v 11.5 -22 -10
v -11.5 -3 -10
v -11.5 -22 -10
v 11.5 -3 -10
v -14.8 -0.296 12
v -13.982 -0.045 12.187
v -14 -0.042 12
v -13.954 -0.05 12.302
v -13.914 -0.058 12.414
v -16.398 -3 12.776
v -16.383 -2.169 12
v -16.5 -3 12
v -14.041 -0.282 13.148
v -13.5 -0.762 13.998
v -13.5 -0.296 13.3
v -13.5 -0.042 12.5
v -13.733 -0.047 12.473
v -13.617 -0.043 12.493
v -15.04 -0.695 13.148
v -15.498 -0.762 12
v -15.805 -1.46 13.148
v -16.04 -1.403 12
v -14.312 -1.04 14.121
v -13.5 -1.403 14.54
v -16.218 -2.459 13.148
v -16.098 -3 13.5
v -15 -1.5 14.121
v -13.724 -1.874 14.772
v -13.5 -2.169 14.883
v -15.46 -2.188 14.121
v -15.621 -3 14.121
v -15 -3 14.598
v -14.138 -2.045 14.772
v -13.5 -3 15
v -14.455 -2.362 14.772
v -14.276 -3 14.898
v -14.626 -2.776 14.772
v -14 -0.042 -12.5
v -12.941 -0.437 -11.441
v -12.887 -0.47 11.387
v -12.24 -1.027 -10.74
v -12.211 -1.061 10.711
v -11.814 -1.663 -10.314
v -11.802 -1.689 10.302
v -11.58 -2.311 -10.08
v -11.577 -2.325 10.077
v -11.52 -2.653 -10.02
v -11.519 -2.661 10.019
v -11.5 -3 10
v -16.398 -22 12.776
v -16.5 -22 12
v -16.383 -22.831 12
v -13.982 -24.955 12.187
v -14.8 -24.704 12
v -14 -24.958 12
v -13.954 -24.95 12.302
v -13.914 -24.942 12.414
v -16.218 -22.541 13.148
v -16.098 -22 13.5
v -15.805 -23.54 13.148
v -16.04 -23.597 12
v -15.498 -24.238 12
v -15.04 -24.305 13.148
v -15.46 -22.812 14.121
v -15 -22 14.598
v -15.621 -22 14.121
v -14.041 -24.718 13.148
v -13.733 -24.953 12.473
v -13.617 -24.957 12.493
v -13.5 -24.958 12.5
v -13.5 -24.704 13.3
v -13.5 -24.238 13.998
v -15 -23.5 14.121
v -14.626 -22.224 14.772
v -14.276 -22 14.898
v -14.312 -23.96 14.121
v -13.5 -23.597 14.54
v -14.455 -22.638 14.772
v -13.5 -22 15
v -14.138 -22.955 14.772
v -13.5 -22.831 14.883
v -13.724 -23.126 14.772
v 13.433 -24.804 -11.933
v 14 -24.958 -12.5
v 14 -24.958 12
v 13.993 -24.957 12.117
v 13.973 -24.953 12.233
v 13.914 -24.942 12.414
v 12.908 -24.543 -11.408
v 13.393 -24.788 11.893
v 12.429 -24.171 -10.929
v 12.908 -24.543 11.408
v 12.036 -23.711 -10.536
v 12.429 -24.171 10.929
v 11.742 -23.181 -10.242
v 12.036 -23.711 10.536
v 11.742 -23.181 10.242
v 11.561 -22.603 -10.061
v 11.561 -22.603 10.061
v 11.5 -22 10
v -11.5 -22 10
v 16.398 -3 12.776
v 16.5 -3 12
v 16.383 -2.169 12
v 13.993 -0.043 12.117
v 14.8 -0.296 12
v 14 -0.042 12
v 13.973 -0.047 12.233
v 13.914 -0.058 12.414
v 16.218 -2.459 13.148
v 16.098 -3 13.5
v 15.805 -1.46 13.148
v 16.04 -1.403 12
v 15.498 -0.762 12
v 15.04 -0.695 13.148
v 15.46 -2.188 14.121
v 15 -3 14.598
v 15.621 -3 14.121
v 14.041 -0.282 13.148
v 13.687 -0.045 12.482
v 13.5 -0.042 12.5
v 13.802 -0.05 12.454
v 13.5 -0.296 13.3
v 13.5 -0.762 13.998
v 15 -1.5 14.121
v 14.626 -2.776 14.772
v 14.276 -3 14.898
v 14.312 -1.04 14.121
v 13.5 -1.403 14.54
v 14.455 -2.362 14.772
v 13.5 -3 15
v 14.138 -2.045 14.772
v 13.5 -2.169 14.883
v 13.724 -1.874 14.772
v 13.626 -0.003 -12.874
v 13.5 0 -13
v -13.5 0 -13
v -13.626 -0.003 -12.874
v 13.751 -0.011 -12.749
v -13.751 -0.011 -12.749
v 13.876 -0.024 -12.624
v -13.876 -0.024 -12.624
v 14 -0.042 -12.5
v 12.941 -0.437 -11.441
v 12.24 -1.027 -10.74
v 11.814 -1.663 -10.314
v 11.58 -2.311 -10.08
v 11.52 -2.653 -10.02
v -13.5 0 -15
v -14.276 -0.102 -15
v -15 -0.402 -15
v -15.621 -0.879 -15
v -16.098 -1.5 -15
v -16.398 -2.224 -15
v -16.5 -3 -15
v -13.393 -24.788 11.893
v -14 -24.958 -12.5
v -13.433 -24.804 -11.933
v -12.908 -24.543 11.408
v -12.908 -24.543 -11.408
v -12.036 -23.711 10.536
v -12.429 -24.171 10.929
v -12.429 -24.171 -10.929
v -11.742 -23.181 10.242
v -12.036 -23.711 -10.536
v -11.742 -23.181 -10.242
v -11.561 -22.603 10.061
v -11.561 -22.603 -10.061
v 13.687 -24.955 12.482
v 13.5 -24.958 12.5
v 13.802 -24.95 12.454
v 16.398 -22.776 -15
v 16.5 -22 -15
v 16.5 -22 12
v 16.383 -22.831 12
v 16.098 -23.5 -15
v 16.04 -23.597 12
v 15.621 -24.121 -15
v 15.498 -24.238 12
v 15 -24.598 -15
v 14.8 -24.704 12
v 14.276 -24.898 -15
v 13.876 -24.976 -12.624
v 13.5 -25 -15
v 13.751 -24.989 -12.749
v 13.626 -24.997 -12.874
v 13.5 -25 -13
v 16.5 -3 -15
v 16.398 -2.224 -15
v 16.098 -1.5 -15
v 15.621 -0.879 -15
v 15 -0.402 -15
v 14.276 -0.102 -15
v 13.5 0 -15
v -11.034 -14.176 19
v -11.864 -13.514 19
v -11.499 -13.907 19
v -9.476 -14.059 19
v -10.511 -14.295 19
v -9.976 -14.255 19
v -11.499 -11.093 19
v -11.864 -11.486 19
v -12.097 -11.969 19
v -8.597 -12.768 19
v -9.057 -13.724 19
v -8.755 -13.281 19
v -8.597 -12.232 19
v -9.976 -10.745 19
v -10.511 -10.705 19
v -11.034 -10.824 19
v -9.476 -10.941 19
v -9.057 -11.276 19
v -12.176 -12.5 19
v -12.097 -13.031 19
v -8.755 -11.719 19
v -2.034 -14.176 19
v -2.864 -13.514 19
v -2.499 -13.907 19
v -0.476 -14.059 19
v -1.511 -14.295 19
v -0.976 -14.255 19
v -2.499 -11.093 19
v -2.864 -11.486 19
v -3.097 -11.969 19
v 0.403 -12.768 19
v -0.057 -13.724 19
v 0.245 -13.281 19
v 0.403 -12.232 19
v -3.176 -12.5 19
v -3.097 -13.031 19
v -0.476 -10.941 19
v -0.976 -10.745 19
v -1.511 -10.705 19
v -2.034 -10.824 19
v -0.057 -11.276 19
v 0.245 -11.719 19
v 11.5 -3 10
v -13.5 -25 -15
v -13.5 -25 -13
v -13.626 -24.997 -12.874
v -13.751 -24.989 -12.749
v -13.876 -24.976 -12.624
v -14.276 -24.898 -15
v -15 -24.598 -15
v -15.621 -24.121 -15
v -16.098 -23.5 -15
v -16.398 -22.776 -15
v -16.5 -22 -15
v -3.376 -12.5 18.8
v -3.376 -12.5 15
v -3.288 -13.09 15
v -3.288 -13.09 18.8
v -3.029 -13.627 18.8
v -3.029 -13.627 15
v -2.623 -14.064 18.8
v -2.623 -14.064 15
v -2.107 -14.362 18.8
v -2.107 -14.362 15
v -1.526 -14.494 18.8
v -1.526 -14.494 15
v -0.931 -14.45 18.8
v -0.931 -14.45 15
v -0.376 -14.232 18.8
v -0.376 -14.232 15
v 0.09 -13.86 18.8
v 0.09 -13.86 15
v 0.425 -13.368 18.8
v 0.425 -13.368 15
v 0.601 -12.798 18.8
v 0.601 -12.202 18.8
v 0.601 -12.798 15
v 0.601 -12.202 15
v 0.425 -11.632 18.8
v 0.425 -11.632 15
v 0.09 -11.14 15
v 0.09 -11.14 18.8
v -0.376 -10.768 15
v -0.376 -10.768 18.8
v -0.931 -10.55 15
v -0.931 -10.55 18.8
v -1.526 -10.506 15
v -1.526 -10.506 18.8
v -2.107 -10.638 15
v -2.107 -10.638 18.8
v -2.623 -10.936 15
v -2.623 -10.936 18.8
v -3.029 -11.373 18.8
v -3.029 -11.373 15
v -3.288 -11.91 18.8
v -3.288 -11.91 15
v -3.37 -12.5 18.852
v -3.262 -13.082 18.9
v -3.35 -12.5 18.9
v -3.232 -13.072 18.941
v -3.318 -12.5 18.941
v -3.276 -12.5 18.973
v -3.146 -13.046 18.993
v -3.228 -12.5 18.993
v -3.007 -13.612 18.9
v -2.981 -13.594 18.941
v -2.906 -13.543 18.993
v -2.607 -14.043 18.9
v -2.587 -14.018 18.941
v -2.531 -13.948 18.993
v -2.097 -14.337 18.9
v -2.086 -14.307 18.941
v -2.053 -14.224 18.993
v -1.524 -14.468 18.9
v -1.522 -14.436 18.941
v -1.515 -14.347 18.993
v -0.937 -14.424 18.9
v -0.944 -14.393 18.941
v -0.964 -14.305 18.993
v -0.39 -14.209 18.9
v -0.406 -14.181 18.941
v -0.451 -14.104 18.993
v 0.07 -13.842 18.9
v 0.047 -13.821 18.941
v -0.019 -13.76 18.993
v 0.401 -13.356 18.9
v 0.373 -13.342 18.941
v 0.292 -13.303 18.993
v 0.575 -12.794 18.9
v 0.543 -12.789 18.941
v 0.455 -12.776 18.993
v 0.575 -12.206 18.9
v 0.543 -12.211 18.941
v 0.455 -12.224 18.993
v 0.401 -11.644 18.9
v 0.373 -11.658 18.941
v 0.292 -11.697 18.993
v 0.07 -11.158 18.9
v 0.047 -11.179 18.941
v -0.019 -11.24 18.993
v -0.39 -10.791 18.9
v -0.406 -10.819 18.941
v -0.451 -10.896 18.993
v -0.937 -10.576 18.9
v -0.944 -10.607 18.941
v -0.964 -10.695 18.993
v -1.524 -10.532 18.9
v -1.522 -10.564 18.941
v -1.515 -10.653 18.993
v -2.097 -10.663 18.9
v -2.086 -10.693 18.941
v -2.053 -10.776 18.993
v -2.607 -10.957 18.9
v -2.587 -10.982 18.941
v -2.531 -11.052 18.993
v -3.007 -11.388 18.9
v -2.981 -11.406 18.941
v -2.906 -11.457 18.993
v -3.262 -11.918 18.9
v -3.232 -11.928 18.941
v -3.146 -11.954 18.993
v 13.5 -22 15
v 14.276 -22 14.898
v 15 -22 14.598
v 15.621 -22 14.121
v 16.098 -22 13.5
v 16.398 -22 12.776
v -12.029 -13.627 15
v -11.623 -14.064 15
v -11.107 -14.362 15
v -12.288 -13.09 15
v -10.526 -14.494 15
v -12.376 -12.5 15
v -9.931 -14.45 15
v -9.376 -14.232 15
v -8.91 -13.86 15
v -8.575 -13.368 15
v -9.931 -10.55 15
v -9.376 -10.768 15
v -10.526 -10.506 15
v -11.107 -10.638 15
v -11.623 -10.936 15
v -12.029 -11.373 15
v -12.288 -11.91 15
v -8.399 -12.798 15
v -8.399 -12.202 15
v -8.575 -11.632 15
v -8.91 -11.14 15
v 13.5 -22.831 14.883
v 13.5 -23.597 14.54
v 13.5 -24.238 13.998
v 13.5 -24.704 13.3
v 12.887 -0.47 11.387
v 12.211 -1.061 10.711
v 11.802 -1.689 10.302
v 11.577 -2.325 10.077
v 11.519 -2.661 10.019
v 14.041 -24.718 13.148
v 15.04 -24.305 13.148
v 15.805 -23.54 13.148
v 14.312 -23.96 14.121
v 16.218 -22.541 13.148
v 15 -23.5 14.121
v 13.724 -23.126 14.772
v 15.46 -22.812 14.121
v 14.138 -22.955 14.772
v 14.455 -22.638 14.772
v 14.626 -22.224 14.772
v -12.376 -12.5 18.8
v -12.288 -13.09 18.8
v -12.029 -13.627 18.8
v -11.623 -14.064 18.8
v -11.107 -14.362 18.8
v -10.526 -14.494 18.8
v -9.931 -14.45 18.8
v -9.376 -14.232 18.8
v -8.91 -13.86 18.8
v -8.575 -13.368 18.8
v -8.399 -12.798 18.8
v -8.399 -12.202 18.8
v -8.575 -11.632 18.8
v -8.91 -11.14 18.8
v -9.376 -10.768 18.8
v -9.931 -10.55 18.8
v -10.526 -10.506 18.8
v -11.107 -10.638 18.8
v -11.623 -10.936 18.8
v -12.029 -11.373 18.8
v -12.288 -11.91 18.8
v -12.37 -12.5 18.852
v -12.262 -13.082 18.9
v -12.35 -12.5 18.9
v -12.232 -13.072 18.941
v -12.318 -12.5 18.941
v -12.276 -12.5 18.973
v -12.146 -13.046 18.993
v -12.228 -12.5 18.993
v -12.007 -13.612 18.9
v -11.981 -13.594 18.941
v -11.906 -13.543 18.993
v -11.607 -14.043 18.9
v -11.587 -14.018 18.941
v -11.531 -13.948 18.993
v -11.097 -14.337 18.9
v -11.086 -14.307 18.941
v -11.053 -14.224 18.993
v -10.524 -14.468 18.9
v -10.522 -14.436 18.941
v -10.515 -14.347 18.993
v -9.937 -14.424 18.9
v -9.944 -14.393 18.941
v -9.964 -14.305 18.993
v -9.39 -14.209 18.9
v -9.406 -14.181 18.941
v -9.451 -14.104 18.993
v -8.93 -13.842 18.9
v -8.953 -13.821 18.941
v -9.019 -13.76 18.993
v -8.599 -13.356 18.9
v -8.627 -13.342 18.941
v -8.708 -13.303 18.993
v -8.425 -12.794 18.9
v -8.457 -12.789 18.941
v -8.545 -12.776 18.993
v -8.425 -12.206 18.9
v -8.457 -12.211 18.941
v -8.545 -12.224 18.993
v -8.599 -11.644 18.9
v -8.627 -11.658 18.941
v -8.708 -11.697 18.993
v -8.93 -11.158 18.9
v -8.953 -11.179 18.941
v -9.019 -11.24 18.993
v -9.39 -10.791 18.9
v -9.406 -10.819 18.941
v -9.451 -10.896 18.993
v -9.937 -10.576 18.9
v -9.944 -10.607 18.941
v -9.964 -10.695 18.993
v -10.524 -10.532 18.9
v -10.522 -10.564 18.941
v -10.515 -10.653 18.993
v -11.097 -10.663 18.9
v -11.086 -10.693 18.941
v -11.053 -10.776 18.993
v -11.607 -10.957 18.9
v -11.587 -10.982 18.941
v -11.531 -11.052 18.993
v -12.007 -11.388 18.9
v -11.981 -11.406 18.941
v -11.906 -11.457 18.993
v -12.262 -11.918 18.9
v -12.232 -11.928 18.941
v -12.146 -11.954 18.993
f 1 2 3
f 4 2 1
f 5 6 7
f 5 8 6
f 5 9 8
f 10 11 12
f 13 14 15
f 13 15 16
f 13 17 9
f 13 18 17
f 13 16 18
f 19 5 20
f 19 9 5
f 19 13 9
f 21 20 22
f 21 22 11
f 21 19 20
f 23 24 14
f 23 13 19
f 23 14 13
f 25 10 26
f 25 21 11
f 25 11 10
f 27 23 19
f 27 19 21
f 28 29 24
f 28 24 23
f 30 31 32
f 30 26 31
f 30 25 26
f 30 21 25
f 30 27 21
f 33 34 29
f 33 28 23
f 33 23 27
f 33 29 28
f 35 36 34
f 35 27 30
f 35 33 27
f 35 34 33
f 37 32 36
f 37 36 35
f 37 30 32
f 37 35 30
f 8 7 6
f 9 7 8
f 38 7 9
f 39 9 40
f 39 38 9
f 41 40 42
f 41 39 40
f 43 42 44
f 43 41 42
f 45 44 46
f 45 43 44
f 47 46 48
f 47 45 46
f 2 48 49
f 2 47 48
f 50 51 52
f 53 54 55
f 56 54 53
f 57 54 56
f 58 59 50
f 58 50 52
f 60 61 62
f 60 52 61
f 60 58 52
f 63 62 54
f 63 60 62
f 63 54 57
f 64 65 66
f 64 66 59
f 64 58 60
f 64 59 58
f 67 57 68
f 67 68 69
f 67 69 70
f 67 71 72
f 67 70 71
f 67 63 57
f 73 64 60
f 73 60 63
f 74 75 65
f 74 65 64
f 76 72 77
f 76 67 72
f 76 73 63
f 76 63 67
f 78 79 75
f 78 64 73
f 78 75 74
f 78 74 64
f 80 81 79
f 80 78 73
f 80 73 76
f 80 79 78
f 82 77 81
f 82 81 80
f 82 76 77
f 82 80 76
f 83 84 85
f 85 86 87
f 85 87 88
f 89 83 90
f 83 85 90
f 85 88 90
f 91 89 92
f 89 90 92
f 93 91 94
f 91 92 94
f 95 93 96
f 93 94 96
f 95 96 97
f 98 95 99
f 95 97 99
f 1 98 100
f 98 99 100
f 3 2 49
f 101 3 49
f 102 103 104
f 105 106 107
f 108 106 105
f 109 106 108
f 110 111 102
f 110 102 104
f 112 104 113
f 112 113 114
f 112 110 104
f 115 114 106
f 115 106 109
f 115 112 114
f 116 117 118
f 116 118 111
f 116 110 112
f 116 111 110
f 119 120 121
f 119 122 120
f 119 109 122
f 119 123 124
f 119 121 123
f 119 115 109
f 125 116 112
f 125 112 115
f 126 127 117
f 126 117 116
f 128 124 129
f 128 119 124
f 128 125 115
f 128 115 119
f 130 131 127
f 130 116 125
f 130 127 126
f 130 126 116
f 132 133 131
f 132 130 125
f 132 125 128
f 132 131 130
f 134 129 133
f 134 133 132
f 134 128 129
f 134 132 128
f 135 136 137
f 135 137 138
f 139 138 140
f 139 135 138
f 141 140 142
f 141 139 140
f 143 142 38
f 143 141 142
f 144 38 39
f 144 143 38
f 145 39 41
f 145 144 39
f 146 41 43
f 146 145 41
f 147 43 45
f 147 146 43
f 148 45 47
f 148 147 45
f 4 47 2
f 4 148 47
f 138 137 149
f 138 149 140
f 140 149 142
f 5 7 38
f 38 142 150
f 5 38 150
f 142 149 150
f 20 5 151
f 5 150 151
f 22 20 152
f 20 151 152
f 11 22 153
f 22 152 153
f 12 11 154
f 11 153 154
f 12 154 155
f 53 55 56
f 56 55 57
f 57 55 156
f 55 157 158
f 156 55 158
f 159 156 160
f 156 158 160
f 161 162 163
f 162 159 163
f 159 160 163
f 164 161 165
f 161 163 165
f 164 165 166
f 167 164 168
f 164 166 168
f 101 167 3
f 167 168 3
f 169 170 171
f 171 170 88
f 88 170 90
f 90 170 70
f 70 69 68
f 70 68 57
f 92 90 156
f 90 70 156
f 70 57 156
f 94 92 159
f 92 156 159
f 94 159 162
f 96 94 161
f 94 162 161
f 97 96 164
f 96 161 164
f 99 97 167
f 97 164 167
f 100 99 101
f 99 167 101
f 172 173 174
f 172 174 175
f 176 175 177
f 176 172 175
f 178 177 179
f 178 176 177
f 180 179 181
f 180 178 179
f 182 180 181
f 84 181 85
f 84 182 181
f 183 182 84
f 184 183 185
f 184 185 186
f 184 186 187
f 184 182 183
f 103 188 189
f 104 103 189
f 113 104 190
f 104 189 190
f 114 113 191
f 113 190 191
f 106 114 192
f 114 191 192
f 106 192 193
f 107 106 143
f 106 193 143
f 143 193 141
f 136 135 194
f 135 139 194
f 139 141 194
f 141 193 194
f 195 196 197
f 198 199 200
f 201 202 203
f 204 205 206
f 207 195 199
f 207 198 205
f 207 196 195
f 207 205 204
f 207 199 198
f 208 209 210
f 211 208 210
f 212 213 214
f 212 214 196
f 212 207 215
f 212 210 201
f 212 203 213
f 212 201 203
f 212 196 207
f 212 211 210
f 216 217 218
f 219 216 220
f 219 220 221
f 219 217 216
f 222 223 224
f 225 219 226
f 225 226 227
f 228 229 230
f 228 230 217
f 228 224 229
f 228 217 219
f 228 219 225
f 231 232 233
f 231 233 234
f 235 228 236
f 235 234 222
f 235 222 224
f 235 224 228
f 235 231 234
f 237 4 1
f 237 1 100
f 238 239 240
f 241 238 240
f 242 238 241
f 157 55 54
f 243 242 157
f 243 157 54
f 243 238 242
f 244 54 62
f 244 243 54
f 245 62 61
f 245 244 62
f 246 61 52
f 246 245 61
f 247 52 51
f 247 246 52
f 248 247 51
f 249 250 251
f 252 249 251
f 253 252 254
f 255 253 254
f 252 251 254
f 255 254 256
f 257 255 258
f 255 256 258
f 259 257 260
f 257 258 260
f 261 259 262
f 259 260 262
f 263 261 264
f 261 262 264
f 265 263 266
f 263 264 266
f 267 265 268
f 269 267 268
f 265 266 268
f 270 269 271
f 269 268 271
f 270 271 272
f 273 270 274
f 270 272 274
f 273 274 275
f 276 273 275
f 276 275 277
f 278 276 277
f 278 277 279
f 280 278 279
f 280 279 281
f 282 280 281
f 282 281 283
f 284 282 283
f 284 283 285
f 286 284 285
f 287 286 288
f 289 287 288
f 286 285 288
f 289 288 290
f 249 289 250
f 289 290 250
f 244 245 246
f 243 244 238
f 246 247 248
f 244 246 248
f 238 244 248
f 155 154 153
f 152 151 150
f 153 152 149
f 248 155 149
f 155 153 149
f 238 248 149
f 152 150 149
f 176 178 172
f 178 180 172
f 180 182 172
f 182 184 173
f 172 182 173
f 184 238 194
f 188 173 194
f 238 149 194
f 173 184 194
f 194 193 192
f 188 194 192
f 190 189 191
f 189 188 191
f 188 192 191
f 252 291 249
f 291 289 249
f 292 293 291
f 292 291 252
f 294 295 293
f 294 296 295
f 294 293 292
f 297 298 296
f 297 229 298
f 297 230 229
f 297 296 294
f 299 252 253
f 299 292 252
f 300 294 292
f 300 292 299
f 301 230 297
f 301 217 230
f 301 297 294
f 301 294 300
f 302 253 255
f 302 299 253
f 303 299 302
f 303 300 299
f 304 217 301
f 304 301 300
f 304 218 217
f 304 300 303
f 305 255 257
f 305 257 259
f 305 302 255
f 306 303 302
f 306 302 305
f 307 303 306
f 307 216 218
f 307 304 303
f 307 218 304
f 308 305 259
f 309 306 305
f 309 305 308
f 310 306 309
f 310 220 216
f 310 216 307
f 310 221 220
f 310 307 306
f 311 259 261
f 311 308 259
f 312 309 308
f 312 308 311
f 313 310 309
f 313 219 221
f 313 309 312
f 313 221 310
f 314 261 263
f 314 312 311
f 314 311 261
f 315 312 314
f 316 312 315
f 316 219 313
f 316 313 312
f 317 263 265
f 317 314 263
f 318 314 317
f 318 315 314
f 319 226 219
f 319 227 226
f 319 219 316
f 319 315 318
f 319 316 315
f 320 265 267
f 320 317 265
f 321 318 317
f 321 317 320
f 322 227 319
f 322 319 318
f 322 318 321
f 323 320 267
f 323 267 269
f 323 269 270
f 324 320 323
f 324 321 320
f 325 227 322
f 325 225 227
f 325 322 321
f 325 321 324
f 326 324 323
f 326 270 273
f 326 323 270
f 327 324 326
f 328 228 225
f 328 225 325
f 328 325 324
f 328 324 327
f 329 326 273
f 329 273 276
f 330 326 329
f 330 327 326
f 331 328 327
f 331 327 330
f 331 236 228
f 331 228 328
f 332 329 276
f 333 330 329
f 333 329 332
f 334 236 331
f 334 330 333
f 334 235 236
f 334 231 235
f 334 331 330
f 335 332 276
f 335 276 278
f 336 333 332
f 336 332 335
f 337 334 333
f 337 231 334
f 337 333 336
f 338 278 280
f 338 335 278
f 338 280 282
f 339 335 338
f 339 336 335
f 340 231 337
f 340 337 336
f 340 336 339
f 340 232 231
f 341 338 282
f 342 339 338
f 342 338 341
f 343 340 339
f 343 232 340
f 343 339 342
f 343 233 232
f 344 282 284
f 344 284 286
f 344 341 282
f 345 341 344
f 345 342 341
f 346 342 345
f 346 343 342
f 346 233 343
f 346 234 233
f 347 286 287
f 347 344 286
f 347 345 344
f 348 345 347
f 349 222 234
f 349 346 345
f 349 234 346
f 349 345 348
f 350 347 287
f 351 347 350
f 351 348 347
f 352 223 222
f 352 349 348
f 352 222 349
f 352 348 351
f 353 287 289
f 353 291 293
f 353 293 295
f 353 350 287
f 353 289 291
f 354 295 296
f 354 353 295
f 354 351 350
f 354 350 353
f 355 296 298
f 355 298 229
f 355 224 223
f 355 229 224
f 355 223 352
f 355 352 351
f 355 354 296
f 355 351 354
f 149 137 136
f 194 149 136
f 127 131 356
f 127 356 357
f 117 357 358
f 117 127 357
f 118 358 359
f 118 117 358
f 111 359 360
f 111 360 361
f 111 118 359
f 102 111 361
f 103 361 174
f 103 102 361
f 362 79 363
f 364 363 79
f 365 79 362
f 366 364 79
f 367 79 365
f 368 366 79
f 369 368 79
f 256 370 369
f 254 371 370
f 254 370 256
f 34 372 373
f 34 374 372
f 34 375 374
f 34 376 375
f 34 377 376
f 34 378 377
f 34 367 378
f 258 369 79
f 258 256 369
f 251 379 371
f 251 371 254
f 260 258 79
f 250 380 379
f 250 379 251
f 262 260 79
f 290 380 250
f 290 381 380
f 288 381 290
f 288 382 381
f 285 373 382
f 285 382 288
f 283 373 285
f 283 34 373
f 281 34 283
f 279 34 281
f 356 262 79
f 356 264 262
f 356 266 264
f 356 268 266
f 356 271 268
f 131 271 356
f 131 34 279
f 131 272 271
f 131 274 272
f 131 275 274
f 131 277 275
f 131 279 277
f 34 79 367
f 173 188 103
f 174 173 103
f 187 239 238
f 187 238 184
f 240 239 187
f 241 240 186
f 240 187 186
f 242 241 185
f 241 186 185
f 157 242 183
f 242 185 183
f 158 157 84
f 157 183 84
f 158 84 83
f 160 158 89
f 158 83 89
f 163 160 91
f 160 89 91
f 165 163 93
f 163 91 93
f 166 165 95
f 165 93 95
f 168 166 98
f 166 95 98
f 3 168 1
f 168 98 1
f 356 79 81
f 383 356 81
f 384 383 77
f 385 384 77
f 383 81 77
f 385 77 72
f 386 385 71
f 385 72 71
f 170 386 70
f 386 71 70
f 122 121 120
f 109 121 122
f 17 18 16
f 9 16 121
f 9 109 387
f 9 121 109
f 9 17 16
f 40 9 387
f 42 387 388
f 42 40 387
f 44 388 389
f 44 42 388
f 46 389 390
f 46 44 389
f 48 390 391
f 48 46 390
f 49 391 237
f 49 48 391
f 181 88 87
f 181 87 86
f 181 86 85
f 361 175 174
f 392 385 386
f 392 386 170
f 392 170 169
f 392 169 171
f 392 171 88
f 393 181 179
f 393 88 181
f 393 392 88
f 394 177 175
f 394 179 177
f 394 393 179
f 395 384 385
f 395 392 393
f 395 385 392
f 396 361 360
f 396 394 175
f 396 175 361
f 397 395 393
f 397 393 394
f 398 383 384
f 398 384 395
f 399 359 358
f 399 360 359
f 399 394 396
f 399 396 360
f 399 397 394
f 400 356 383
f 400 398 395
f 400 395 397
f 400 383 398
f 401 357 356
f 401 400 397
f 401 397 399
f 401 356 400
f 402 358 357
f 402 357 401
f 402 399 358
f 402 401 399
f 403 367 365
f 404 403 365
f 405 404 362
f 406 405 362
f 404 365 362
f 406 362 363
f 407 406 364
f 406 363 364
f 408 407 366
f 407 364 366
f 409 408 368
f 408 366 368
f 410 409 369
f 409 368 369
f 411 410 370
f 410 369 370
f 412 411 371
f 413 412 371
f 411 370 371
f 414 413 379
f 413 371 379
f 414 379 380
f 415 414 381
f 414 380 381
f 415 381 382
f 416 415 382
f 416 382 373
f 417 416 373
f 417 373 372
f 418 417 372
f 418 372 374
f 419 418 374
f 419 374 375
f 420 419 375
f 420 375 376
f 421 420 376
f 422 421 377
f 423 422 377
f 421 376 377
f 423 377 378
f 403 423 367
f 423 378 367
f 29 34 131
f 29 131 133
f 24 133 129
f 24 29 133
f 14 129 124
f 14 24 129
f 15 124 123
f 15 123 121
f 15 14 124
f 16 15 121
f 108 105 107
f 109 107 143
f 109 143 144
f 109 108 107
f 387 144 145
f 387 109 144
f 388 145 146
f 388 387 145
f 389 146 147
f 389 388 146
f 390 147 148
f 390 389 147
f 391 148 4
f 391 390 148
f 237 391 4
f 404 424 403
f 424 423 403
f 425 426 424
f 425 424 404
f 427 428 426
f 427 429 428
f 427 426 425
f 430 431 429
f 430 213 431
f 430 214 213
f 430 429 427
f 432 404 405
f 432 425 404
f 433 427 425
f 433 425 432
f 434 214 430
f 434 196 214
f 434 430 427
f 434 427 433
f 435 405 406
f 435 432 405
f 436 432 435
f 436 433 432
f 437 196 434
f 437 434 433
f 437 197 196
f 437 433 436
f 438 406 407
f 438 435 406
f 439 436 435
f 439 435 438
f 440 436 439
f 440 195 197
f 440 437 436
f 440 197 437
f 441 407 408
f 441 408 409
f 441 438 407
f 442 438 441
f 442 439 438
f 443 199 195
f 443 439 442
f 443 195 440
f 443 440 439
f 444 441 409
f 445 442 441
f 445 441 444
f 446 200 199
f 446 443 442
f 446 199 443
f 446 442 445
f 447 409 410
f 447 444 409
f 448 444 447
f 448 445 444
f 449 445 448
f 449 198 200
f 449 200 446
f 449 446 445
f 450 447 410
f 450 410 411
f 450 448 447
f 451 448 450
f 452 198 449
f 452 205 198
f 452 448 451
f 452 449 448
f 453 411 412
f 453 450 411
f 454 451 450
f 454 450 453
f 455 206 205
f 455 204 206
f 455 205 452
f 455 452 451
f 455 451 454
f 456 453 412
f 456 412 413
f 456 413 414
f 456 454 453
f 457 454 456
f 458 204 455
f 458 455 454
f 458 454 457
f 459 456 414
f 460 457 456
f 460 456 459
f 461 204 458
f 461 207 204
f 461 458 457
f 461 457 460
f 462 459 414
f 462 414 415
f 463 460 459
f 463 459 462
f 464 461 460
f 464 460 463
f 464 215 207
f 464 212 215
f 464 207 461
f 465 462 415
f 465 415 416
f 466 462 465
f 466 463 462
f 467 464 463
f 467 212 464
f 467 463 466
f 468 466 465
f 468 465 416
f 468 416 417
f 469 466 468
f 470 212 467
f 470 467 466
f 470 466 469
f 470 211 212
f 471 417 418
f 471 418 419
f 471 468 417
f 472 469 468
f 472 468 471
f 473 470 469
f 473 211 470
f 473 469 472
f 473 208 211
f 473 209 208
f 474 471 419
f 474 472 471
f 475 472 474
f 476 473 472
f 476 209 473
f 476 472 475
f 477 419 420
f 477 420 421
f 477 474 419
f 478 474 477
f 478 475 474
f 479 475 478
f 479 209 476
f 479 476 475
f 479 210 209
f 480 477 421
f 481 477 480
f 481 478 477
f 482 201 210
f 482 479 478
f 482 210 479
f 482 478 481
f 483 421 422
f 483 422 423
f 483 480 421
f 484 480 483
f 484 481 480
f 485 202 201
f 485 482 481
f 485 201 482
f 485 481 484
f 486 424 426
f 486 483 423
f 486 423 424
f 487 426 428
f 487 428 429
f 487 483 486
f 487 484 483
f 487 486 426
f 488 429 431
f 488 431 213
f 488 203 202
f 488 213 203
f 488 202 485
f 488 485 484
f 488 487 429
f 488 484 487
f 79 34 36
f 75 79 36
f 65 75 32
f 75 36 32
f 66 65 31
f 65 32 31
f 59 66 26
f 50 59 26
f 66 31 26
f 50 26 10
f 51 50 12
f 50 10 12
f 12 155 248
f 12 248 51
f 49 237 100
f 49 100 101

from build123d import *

# Parameters (mm, degrees)
F0_W          = 33
F0_H          = 30
F0_W_2        = 23
F0_H_2        = 20
F1_DEPTH      = 25
F3_DEPTH      = 4
F4_R          = 0.2
F5_T1_DEPTH   = 20
F5_T3_DEPTH   = 23
F5_T5_DEPTH   = 27
F5_T7_DEPTH   = 34.5
F5_T9_DEPTH   = 19
F5_S13_W      = 3
F5_S13_H      = 3
F5_T14_DEPTH  = 3
F5_S19_W      = 3
F5_S19_H      = 3
F5_T20_DEPTH  = 3
F5_S25_W      = 3
F5_S25_H      = 3
F5_T26_DEPTH  = 3
F5_S31_W      = 3
F5_S31_H      = 3
F5_T32_DEPTH  = 3
F5_T39_DEPTH  = 27.5
F5_T43_DEPTH  = 30.5
F5_T50_DEPTH  = 27.5
F5_T54_DEPTH  = 30.5
F5_T61_DEPTH  = 30.5
F5_T65_DEPTH  = 27.5
F5_T72_DEPTH  = 27.5
F5_T76_DEPTH  = 30.5
F5_T83_DEPTH  = 27.5
F5_T87_DEPTH  = 30.5
F5_T94_DEPTH  = 27.5
F5_T98_DEPTH  = 30.5
F5_T105_DEPTH = 30.5
F5_T109_DEPTH = 27.5
F5_T116_DEPTH = 27.5
F5_T120_DEPTH = 30.5


# Not quite as in the source:
# - a fillet or chamfer that OpenCascade refuses, or shapes differently, is made with other operations: its cross-section is extruded or revolved along the edge and cut away or added


with BuildPart() as f1:
    # F0 (on Front) → F1 (new body)
    with BuildSketch(Plane.XZ):
        Rectangle(F0_W, F0_H)
        Rectangle(F0_W_2, F0_H_2, mode=Mode.SUBTRACT)
    extrude(amount=F1_DEPTH)

    # F2 (on face) → F3 (join)
    with BuildSketch(Plane.XY.offset(15)):
        with BuildLine():
            Line((-12.3764710948, -12.5), (-8.3764710948, -12.5))
            ThreePointArc((-8.3764710948, -12.5), (-10.3764710948, -10.5), (-12.3764710948, -12.5))
        make_face()
        with BuildLine():
            ThreePointArc((-12.3764710948, -12.5), (-10.3764710948, -14.5), (-8.3764710948, -12.5))
            Line((-8.3764710948, -12.5), (-12.3764710948, -12.5))
        make_face()
        with BuildLine():
            Line((-3.3764710948, -12.5), (0.6235289052, -12.5))
            ThreePointArc((0.6235289052, -12.5), (-1.3764710948, -10.5), (-3.3764710948, -12.5))
        make_face()
        with BuildLine():
            ThreePointArc((-3.3764710948, -12.5), (-1.3764710948, -14.5), (0.6235289052, -12.5))
            Line((0.6235289052, -12.5), (-3.3764710948, -12.5))
        make_face()
    extrude(amount=F3_DEPTH)

    # F4
    f4_edges = [f1.edges().sort_by_distance(p)[0] for p in [
        (-8.376471, -12.5, 19),
        (0.623529, -12.5, 19),
    ]]
    fillet(f4_edges, radius=F4_R)

    # F5: fillet of radius 3 on 16 edges, made by hand

    # F5_s2 → F5_t1 (cut)
    with BuildSketch(Plane.XY.offset(-10)):
        with BuildLine():
            ThreePointArc((-14.5, -25), (-12.3786796564, -24.1213203436), (-11.5, -22))
            Line((-11.5, -22), (-11.5, -25))
            Line((-11.5, -25), (-14.5, -25))
        make_face()
        with BuildLine():
            ThreePointArc((14.5, -25), (12.3786796564, -24.1213203436), (11.5, -22))
            Line((11.5, -22), (11.5, -25))
            Line((11.5, -25), (14.5, -25))
        make_face()
        with BuildLine():
            ThreePointArc((-14.5, 0), (-12.3786796564, -0.8786796564), (-11.5, -3))
            Line((-11.5, -3), (-11.5, 0))
            Line((-11.5, 0), (-14.5, 0))
        make_face()
        with BuildLine():
            ThreePointArc((14.5, 0), (12.3786796564, -0.8786796564), (11.5, -3))
            Line((11.5, -3), (11.5, 0))
            Line((11.5, 0), (14.5, 0))
        make_face()
    extrude(amount=F5_T1_DEPTH, mode=Mode.SUBTRACT)

    # F5_s4 → F5_t3 (cut)
    with BuildSketch(Plane.YZ.offset(-11.5)):
        with BuildLine():
            ThreePointArc((-25, 13), (-24.1213203436, 10.8786796564), (-22, 10))
            Line((-22, 10), (-25, 10))
            Line((-25, 10), (-25, 13))
        make_face()
        with BuildLine():
            ThreePointArc((-25, -13), (-24.1213203436, -10.8786796564), (-22, -10))
            Line((-22, -10), (-25, -10))
            Line((-25, -10), (-25, -13))
        make_face()
        with BuildLine():
            ThreePointArc((0, 13), (-0.8786796564, 10.8786796564), (-3, 10))
            Line((-3, 10), (0, 10))
            Line((0, 10), (0, 13))
        make_face()
        with BuildLine():
            ThreePointArc((0, -13), (-0.8786796564, -10.8786796564), (-3, -10))
            Line((-3, -10), (0, -10))
            Line((0, -10), (0, -13))
        make_face()
    extrude(amount=F5_T3_DEPTH, mode=Mode.SUBTRACT)

    # F5_s6 → F5_t5 (cut)
    with BuildSketch(Plane.YZ.offset(-13.5)):
        with BuildLine():
            ThreePointArc((-3, 15), (-0.8786796564, 14.1213203436), (0, 12))
            Line((0, 12), (0, 15))
            Line((0, 15), (-3, 15))
        make_face()
        with BuildLine():
            ThreePointArc((-22, 15), (-24.1213203436, 14.1213203436), (-25, 12))
            Line((-25, 12), (-25, 15))
            Line((-25, 15), (-22, 15))
        make_face()
    extrude(amount=F5_T5_DEPTH, mode=Mode.SUBTRACT)

    # F5_s8 → F5_t7 (cut)
    with BuildSketch(Plane.XY.offset(-22.5)):
        with BuildLine():
            ThreePointArc((16.5, -3), (15.6213203436, -0.8786796564), (13.5, 0))
            Line((13.5, 0), (16.5, 0))
            Line((16.5, 0), (16.5, -3))
        make_face()
        with BuildLine():
            ThreePointArc((-13.5, 0), (-15.6213203436, -0.8786796564), (-16.5, -3))
            Line((-16.5, -3), (-16.5, 0))
            Line((-16.5, 0), (-13.5, 0))
        make_face()
        with BuildLine():
            ThreePointArc((-13.5, -25), (-15.6213203436, -24.1213203436), (-16.5, -22))
            Line((-16.5, -22), (-16.5, -25))
            Line((-16.5, -25), (-13.5, -25))
        make_face()
        with BuildLine():
            ThreePointArc((16.5, -22), (15.6213203436, -24.1213203436), (13.5, -25))
            Line((13.5, -25), (16.5, -25))
            Line((16.5, -25), (16.5, -22))
        make_face()
    extrude(amount=F5_T7_DEPTH, mode=Mode.SUBTRACT)

    # F5_s10 → F5_t9 (cut)
    with BuildSketch(Plane.XZ.offset(3)):
        with BuildLine():
            ThreePointArc((-13.5, 15), (-15.6213203436, 14.1213203436), (-16.5, 12))
            Line((-16.5, 12), (-16.5, 15))
            Line((-16.5, 15), (-13.5, 15))
        make_face()
        with BuildLine():
            ThreePointArc((13.5, 15), (15.6213203436, 14.1213203436), (16.5, 12))
            Line((16.5, 12), (16.5, 15))
            Line((16.5, 15), (13.5, 15))
        make_face()
    extrude(amount=F5_T9_DEPTH, mode=Mode.SUBTRACT)


with BuildPart() as f5_tool12:
    # F5_s13 → F5_t14 (new body)
    with BuildSketch(Plane.XY.offset(12)):
        with Locations((15, -1.5)):
            Rectangle(F5_S13_W, F5_S13_H)
    extrude(amount=F5_T14_DEPTH)

    # F5_s15 → F5_t16 (revolve, cut)
    with BuildSketch(Plane(origin=(13.5, -3, 12), x_dir=(-0.7071067812, -0.7071067812, 0), z_dir=(-0.7071067812, 0.7071067812, 0))):
        with BuildLine():
            ThreePointArc((0, -3), (3, 0), (0, 3))
            Line((0, 3), (0, -3))
        make_face()
    revolve(axis=Axis((13.5, -3, 12), (0, 0, 1)), mode=Mode.SUBTRACT)


with BuildPart() as f1_1:
    add(f1.part)

    # F5_t11: cut F5_tool12
    add(f5_tool12.part, mode=Mode.SUBTRACT)


with BuildPart() as f5_tool18:
    # F5_s19 → F5_t20 (new body)
    with BuildSketch(Plane.XY.offset(12)):
        with Locations((-15, -1.5)):
            Rectangle(F5_S19_W, F5_S19_H)
    extrude(amount=F5_T20_DEPTH)

    # F5_s21 → F5_t22 (revolve, cut)
    with BuildSketch(Plane(origin=(-13.5, -3, 12), x_dir=(0.7071067812, -0.7071067812, 0), z_dir=(-0.7071067812, -0.7071067812, 0))):
        with BuildLine():
            ThreePointArc((0, -3), (3, 0), (0, 3))
            Line((0, 3), (0, -3))
        make_face()
    revolve(axis=Axis((-13.5, -3, 12), (0, 0, 1)), mode=Mode.SUBTRACT)


with BuildPart() as f1_2:
    add(f1_1.part)

    # F5_t17: cut F5_tool18
    add(f5_tool18.part, mode=Mode.SUBTRACT)


with BuildPart() as f5_tool24:
    # F5_s25 → F5_t26 (new body)
    with BuildSketch(Plane.XY.offset(12)):
        with Locations((-15, -23.5)):
            Rectangle(F5_S25_W, F5_S25_H)
    extrude(amount=F5_T26_DEPTH)

    # F5_s27 → F5_t28 (revolve, cut)
    with BuildSketch(Plane(origin=(-13.5, -22, 12), x_dir=(0.7071067812, 0.7071067812, 0), z_dir=(0.7071067812, -0.7071067812, 0))):
        with BuildLine():
            ThreePointArc((0, -3), (3, 0), (0, 3))
            Line((0, 3), (0, -3))
        make_face()
    revolve(axis=Axis((-13.5, -22, 12), (0, 0, 1)), mode=Mode.SUBTRACT)


with BuildPart() as f1_3:
    add(f1_2.part)

    # F5_t23: cut F5_tool24
    add(f5_tool24.part, mode=Mode.SUBTRACT)


with BuildPart() as f5_tool30:
    # F5_s31 → F5_t32 (new body)
    with BuildSketch(Plane.XY.offset(12)):
        with Locations((15, -23.5)):
            Rectangle(F5_S31_W, F5_S31_H)
    extrude(amount=F5_T32_DEPTH)

    # F5_s33 → F5_t34 (revolve, cut)
    with BuildSketch(Plane(origin=(13.5, -22, 12), x_dir=(-0.7071067812, 0.7071067812, 0), z_dir=(0.7071067812, 0.7071067812, 0))):
        with BuildLine():
            ThreePointArc((0, -3), (3, 0), (0, 3))
            Line((0, 3), (0, -3))
        make_face()
    revolve(axis=Axis((13.5, -22, 12), (0, 0, 1)), mode=Mode.SUBTRACT)


with BuildPart() as f1_4:
    add(f1_3.part)

    # F5_t29: cut F5_tool30
    add(f5_tool30.part, mode=Mode.SUBTRACT)


with BuildPart() as f5_tool37:
    # F5_s38 → F5_t39 (new body)
    with BuildSketch(Plane.XY.offset(-17.5)):
        with BuildLine():
            ThreePointArc((-14.5, -25), (-12.3786796564, -24.1213203436), (-11.5, -22))
            Line((-11.5, -22), (-11.5, -25))
            Line((-11.5, -25), (-14.5, -25))
        make_face()
    extrude(amount=F5_T39_DEPTH)

    split(bisect_by=Plane.XY.offset(-10), keep=Keep.BOTTOM)


with BuildPart() as f5_tool41:
    # F5_s42 → F5_t43 (new body)
    with BuildSketch(Plane.YZ.offset(11.5)):
        with BuildLine():
            ThreePointArc((-25, -13), (-24.1213203436, -10.8786796564), (-22, -10))
            Line((-22, -10), (-25, -10))
            Line((-25, -10), (-25, -13))
        make_face()
    extrude(amount=-F5_T43_DEPTH)

    split(bisect_by=Plane.YZ.offset(-11.5), keep=Keep.BOTTOM)


with BuildPart() as f5_tool37_1:
    add(f5_tool37.part)

    # F5_t45: intersect F5_tool41
    add(f5_tool41.part, mode=Mode.INTERSECT)


with BuildPart() as f1_5:
    add(f1_4.part)

    # F5_t35: cut F5_tool37
    add(f5_tool37_1.part, mode=Mode.SUBTRACT)


with BuildPart() as f5_tool48:
    # F5_s49 → F5_t50 (new body)
    with BuildSketch(Plane.XY.offset(-10)):
        with BuildLine():
            ThreePointArc((-14.5, -25), (-12.3786796564, -24.1213203436), (-11.5, -22))
            Line((-11.5, -22), (-11.5, -25))
            Line((-11.5, -25), (-14.5, -25))
        make_face()
    extrude(amount=F5_T50_DEPTH)

    split(bisect_by=Plane.XY.offset(10), keep=Keep.TOP)


with BuildPart() as f5_tool52:
    # F5_s53 → F5_t54 (new body)
    with BuildSketch(Plane.YZ.offset(-19)):
        with BuildLine():
            ThreePointArc((-25, 13), (-24.1213203436, 10.8786796564), (-22, 10))
            Line((-22, 10), (-25, 10))
            Line((-25, 10), (-25, 13))
        make_face()
    extrude(amount=F5_T54_DEPTH)

    split(bisect_by=Plane.YZ.offset(-11.5), keep=Keep.BOTTOM)


with BuildPart() as f5_tool48_1:
    add(f5_tool48.part)

    # F5_t56: intersect F5_tool52
    add(f5_tool52.part, mode=Mode.INTERSECT)


with BuildPart() as f1_6:
    add(f1_5.part)

    # F5_t46: cut F5_tool48
    add(f5_tool48_1.part, mode=Mode.SUBTRACT)


with BuildPart() as f5_tool59:
    # F5_s60 → F5_t61 (new body)
    with BuildSketch(Plane.YZ.offset(-11.5)):
        with BuildLine():
            ThreePointArc((-25, 13), (-24.1213203436, 10.8786796564), (-22, 10))
            Line((-22, 10), (-25, 10))
            Line((-25, 10), (-25, 13))
        make_face()
    extrude(amount=F5_T61_DEPTH)

    split(bisect_by=Plane.YZ.offset(11.5), keep=Keep.TOP)


with BuildPart() as f5_tool63:
    # F5_s64 → F5_t65 (new body)
    with BuildSketch(Plane.XY.offset(17.5)):
        with BuildLine():
            ThreePointArc((14.5, -25), (12.3786796564, -24.1213203436), (11.5, -22))
            Line((11.5, -22), (11.5, -25))
            Line((11.5, -25), (14.5, -25))
        make_face()
    extrude(amount=-F5_T65_DEPTH)

    split(bisect_by=Plane.XY.offset(10), keep=Keep.TOP)


with BuildPart() as f5_tool59_1:
    add(f5_tool59.part)

    # F5_t67: intersect F5_tool63
    add(f5_tool63.part, mode=Mode.INTERSECT)


with BuildPart() as f1_7:
    add(f1_6.part)

    # F5_t57: cut F5_tool59
    add(f5_tool59_1.part, mode=Mode.SUBTRACT)


with BuildPart() as f5_tool70:
    # F5_s71 → F5_t72 (new body)
    with BuildSketch(Plane.XY.offset(10)):
        with BuildLine():
            ThreePointArc((14.5, -25), (12.3786796564, -24.1213203436), (11.5, -22))
            Line((11.5, -22), (11.5, -25))
            Line((11.5, -25), (14.5, -25))
        make_face()
    extrude(amount=-F5_T72_DEPTH)

    split(bisect_by=Plane.XY.offset(-10), keep=Keep.BOTTOM)


with BuildPart() as f5_tool74:
    # F5_s75 → F5_t76 (new body)
    with BuildSketch(Plane.YZ.offset(19)):
        with BuildLine():
            ThreePointArc((-25, -13), (-24.1213203436, -10.8786796564), (-22, -10))
            Line((-22, -10), (-25, -10))
            Line((-25, -10), (-25, -13))
        make_face()
    extrude(amount=-F5_T76_DEPTH)

    split(bisect_by=Plane.YZ.offset(11.5), keep=Keep.TOP)


with BuildPart() as f5_tool70_1:
    add(f5_tool70.part)

    # F5_t78: intersect F5_tool74
    add(f5_tool74.part, mode=Mode.INTERSECT)


with BuildPart() as f1_8:
    add(f1_7.part)

    # F5_t68: cut F5_tool70
    add(f5_tool70_1.part, mode=Mode.SUBTRACT)


with BuildPart() as f5_tool81:
    # F5_s82 → F5_t83 (new body)
    with BuildSketch(Plane.XY.offset(-17.5)):
        with BuildLine():
            ThreePointArc((-14.5, 0), (-12.3786796564, -0.8786796564), (-11.5, -3))
            Line((-11.5, -3), (-11.5, 0))
            Line((-11.5, 0), (-14.5, 0))
        make_face()
    extrude(amount=F5_T83_DEPTH)

    split(bisect_by=Plane.XY.offset(-10), keep=Keep.BOTTOM)


with BuildPart() as f5_tool85:
    # F5_s86 → F5_t87 (new body)
    with BuildSketch(Plane.YZ.offset(11.5)):
        with BuildLine():
            ThreePointArc((0, -13), (-0.8786796564, -10.8786796564), (-3, -10))
            Line((-3, -10), (0, -10))
            Line((0, -10), (0, -13))
        make_face()
    extrude(amount=-F5_T87_DEPTH)

    split(bisect_by=Plane.YZ.offset(-11.5), keep=Keep.BOTTOM)


with BuildPart() as f5_tool81_1:
    add(f5_tool81.part)

    # F5_t89: intersect F5_tool85
    add(f5_tool85.part, mode=Mode.INTERSECT)


with BuildPart() as f1_9:
    add(f1_8.part)

    # F5_t79: cut F5_tool81
    add(f5_tool81_1.part, mode=Mode.SUBTRACT)


with BuildPart() as f5_tool92:
    # F5_s93 → F5_t94 (new body)
    with BuildSketch(Plane.XY.offset(-10)):
        with BuildLine():
            ThreePointArc((-14.5, 0), (-12.3786796564, -0.8786796564), (-11.5, -3))
            Line((-11.5, -3), (-11.5, 0))
            Line((-11.5, 0), (-14.5, 0))
        make_face()
    extrude(amount=F5_T94_DEPTH)

    split(bisect_by=Plane.XY.offset(10), keep=Keep.TOP)


with BuildPart() as f5_tool96:
    # F5_s97 → F5_t98 (new body)
    with BuildSketch(Plane.YZ.offset(-19)):
        with BuildLine():
            ThreePointArc((0, 13), (-0.8786796564, 10.8786796564), (-3, 10))
            Line((-3, 10), (0, 10))
            Line((0, 10), (0, 13))
        make_face()
    extrude(amount=F5_T98_DEPTH)

    split(bisect_by=Plane.YZ.offset(-11.5), keep=Keep.BOTTOM)


with BuildPart() as f5_tool92_1:
    add(f5_tool92.part)

    # F5_t100: intersect F5_tool96
    add(f5_tool96.part, mode=Mode.INTERSECT)


with BuildPart() as f1_10:
    add(f1_9.part)

    # F5_t90: cut F5_tool92
    add(f5_tool92_1.part, mode=Mode.SUBTRACT)


with BuildPart() as f5_tool103:
    # F5_s104 → F5_t105 (new body)
    with BuildSketch(Plane.YZ.offset(-11.5)):
        with BuildLine():
            ThreePointArc((0, 13), (-0.8786796564, 10.8786796564), (-3, 10))
            Line((-3, 10), (0, 10))
            Line((0, 10), (0, 13))
        make_face()
    extrude(amount=F5_T105_DEPTH)

    split(bisect_by=Plane.YZ.offset(11.5), keep=Keep.TOP)


with BuildPart() as f5_tool107:
    # F5_s108 → F5_t109 (new body)
    with BuildSketch(Plane.XY.offset(17.5)):
        with BuildLine():
            ThreePointArc((14.5, 0), (12.3786796564, -0.8786796564), (11.5, -3))
            Line((11.5, -3), (11.5, 0))
            Line((11.5, 0), (14.5, 0))
        make_face()
    extrude(amount=-F5_T109_DEPTH)

    split(bisect_by=Plane.XY.offset(10), keep=Keep.TOP)


with BuildPart() as f5_tool103_1:
    add(f5_tool103.part)

    # F5_t111: intersect F5_tool107
    add(f5_tool107.part, mode=Mode.INTERSECT)


with BuildPart() as f1_11:
    add(f1_10.part)

    # F5_t101: cut F5_tool103
    add(f5_tool103_1.part, mode=Mode.SUBTRACT)


with BuildPart() as f5_tool114:
    # F5_s115 → F5_t116 (new body)
    with BuildSketch(Plane.XY.offset(10)):
        with BuildLine():
            ThreePointArc((14.5, 0), (12.3786796564, -0.8786796564), (11.5, -3))
            Line((11.5, -3), (11.5, 0))
            Line((11.5, 0), (14.5, 0))
        make_face()
    extrude(amount=-F5_T116_DEPTH)

    split(bisect_by=Plane.XY.offset(-10), keep=Keep.BOTTOM)


with BuildPart() as f5_tool118:
    # F5_s119 → F5_t120 (new body)
    with BuildSketch(Plane.YZ.offset(19)):
        with BuildLine():
            ThreePointArc((0, -13), (-0.8786796564, -10.8786796564), (-3, -10))
            Line((-3, -10), (0, -10))
            Line((0, -10), (0, -13))
        make_face()
    extrude(amount=-F5_T120_DEPTH)

    split(bisect_by=Plane.YZ.offset(11.5), keep=Keep.TOP)


with BuildPart() as f5_tool114_1:
    add(f5_tool114.part)

    # F5_t122: intersect F5_tool118
    add(f5_tool118.part, mode=Mode.INTERSECT)


with BuildPart() as f1_12:
    add(f1_11.part)

    # F5_t112: cut F5_tool114
    add(f5_tool114_1.part, mode=Mode.SUBTRACT)


solid = f1_12.part
